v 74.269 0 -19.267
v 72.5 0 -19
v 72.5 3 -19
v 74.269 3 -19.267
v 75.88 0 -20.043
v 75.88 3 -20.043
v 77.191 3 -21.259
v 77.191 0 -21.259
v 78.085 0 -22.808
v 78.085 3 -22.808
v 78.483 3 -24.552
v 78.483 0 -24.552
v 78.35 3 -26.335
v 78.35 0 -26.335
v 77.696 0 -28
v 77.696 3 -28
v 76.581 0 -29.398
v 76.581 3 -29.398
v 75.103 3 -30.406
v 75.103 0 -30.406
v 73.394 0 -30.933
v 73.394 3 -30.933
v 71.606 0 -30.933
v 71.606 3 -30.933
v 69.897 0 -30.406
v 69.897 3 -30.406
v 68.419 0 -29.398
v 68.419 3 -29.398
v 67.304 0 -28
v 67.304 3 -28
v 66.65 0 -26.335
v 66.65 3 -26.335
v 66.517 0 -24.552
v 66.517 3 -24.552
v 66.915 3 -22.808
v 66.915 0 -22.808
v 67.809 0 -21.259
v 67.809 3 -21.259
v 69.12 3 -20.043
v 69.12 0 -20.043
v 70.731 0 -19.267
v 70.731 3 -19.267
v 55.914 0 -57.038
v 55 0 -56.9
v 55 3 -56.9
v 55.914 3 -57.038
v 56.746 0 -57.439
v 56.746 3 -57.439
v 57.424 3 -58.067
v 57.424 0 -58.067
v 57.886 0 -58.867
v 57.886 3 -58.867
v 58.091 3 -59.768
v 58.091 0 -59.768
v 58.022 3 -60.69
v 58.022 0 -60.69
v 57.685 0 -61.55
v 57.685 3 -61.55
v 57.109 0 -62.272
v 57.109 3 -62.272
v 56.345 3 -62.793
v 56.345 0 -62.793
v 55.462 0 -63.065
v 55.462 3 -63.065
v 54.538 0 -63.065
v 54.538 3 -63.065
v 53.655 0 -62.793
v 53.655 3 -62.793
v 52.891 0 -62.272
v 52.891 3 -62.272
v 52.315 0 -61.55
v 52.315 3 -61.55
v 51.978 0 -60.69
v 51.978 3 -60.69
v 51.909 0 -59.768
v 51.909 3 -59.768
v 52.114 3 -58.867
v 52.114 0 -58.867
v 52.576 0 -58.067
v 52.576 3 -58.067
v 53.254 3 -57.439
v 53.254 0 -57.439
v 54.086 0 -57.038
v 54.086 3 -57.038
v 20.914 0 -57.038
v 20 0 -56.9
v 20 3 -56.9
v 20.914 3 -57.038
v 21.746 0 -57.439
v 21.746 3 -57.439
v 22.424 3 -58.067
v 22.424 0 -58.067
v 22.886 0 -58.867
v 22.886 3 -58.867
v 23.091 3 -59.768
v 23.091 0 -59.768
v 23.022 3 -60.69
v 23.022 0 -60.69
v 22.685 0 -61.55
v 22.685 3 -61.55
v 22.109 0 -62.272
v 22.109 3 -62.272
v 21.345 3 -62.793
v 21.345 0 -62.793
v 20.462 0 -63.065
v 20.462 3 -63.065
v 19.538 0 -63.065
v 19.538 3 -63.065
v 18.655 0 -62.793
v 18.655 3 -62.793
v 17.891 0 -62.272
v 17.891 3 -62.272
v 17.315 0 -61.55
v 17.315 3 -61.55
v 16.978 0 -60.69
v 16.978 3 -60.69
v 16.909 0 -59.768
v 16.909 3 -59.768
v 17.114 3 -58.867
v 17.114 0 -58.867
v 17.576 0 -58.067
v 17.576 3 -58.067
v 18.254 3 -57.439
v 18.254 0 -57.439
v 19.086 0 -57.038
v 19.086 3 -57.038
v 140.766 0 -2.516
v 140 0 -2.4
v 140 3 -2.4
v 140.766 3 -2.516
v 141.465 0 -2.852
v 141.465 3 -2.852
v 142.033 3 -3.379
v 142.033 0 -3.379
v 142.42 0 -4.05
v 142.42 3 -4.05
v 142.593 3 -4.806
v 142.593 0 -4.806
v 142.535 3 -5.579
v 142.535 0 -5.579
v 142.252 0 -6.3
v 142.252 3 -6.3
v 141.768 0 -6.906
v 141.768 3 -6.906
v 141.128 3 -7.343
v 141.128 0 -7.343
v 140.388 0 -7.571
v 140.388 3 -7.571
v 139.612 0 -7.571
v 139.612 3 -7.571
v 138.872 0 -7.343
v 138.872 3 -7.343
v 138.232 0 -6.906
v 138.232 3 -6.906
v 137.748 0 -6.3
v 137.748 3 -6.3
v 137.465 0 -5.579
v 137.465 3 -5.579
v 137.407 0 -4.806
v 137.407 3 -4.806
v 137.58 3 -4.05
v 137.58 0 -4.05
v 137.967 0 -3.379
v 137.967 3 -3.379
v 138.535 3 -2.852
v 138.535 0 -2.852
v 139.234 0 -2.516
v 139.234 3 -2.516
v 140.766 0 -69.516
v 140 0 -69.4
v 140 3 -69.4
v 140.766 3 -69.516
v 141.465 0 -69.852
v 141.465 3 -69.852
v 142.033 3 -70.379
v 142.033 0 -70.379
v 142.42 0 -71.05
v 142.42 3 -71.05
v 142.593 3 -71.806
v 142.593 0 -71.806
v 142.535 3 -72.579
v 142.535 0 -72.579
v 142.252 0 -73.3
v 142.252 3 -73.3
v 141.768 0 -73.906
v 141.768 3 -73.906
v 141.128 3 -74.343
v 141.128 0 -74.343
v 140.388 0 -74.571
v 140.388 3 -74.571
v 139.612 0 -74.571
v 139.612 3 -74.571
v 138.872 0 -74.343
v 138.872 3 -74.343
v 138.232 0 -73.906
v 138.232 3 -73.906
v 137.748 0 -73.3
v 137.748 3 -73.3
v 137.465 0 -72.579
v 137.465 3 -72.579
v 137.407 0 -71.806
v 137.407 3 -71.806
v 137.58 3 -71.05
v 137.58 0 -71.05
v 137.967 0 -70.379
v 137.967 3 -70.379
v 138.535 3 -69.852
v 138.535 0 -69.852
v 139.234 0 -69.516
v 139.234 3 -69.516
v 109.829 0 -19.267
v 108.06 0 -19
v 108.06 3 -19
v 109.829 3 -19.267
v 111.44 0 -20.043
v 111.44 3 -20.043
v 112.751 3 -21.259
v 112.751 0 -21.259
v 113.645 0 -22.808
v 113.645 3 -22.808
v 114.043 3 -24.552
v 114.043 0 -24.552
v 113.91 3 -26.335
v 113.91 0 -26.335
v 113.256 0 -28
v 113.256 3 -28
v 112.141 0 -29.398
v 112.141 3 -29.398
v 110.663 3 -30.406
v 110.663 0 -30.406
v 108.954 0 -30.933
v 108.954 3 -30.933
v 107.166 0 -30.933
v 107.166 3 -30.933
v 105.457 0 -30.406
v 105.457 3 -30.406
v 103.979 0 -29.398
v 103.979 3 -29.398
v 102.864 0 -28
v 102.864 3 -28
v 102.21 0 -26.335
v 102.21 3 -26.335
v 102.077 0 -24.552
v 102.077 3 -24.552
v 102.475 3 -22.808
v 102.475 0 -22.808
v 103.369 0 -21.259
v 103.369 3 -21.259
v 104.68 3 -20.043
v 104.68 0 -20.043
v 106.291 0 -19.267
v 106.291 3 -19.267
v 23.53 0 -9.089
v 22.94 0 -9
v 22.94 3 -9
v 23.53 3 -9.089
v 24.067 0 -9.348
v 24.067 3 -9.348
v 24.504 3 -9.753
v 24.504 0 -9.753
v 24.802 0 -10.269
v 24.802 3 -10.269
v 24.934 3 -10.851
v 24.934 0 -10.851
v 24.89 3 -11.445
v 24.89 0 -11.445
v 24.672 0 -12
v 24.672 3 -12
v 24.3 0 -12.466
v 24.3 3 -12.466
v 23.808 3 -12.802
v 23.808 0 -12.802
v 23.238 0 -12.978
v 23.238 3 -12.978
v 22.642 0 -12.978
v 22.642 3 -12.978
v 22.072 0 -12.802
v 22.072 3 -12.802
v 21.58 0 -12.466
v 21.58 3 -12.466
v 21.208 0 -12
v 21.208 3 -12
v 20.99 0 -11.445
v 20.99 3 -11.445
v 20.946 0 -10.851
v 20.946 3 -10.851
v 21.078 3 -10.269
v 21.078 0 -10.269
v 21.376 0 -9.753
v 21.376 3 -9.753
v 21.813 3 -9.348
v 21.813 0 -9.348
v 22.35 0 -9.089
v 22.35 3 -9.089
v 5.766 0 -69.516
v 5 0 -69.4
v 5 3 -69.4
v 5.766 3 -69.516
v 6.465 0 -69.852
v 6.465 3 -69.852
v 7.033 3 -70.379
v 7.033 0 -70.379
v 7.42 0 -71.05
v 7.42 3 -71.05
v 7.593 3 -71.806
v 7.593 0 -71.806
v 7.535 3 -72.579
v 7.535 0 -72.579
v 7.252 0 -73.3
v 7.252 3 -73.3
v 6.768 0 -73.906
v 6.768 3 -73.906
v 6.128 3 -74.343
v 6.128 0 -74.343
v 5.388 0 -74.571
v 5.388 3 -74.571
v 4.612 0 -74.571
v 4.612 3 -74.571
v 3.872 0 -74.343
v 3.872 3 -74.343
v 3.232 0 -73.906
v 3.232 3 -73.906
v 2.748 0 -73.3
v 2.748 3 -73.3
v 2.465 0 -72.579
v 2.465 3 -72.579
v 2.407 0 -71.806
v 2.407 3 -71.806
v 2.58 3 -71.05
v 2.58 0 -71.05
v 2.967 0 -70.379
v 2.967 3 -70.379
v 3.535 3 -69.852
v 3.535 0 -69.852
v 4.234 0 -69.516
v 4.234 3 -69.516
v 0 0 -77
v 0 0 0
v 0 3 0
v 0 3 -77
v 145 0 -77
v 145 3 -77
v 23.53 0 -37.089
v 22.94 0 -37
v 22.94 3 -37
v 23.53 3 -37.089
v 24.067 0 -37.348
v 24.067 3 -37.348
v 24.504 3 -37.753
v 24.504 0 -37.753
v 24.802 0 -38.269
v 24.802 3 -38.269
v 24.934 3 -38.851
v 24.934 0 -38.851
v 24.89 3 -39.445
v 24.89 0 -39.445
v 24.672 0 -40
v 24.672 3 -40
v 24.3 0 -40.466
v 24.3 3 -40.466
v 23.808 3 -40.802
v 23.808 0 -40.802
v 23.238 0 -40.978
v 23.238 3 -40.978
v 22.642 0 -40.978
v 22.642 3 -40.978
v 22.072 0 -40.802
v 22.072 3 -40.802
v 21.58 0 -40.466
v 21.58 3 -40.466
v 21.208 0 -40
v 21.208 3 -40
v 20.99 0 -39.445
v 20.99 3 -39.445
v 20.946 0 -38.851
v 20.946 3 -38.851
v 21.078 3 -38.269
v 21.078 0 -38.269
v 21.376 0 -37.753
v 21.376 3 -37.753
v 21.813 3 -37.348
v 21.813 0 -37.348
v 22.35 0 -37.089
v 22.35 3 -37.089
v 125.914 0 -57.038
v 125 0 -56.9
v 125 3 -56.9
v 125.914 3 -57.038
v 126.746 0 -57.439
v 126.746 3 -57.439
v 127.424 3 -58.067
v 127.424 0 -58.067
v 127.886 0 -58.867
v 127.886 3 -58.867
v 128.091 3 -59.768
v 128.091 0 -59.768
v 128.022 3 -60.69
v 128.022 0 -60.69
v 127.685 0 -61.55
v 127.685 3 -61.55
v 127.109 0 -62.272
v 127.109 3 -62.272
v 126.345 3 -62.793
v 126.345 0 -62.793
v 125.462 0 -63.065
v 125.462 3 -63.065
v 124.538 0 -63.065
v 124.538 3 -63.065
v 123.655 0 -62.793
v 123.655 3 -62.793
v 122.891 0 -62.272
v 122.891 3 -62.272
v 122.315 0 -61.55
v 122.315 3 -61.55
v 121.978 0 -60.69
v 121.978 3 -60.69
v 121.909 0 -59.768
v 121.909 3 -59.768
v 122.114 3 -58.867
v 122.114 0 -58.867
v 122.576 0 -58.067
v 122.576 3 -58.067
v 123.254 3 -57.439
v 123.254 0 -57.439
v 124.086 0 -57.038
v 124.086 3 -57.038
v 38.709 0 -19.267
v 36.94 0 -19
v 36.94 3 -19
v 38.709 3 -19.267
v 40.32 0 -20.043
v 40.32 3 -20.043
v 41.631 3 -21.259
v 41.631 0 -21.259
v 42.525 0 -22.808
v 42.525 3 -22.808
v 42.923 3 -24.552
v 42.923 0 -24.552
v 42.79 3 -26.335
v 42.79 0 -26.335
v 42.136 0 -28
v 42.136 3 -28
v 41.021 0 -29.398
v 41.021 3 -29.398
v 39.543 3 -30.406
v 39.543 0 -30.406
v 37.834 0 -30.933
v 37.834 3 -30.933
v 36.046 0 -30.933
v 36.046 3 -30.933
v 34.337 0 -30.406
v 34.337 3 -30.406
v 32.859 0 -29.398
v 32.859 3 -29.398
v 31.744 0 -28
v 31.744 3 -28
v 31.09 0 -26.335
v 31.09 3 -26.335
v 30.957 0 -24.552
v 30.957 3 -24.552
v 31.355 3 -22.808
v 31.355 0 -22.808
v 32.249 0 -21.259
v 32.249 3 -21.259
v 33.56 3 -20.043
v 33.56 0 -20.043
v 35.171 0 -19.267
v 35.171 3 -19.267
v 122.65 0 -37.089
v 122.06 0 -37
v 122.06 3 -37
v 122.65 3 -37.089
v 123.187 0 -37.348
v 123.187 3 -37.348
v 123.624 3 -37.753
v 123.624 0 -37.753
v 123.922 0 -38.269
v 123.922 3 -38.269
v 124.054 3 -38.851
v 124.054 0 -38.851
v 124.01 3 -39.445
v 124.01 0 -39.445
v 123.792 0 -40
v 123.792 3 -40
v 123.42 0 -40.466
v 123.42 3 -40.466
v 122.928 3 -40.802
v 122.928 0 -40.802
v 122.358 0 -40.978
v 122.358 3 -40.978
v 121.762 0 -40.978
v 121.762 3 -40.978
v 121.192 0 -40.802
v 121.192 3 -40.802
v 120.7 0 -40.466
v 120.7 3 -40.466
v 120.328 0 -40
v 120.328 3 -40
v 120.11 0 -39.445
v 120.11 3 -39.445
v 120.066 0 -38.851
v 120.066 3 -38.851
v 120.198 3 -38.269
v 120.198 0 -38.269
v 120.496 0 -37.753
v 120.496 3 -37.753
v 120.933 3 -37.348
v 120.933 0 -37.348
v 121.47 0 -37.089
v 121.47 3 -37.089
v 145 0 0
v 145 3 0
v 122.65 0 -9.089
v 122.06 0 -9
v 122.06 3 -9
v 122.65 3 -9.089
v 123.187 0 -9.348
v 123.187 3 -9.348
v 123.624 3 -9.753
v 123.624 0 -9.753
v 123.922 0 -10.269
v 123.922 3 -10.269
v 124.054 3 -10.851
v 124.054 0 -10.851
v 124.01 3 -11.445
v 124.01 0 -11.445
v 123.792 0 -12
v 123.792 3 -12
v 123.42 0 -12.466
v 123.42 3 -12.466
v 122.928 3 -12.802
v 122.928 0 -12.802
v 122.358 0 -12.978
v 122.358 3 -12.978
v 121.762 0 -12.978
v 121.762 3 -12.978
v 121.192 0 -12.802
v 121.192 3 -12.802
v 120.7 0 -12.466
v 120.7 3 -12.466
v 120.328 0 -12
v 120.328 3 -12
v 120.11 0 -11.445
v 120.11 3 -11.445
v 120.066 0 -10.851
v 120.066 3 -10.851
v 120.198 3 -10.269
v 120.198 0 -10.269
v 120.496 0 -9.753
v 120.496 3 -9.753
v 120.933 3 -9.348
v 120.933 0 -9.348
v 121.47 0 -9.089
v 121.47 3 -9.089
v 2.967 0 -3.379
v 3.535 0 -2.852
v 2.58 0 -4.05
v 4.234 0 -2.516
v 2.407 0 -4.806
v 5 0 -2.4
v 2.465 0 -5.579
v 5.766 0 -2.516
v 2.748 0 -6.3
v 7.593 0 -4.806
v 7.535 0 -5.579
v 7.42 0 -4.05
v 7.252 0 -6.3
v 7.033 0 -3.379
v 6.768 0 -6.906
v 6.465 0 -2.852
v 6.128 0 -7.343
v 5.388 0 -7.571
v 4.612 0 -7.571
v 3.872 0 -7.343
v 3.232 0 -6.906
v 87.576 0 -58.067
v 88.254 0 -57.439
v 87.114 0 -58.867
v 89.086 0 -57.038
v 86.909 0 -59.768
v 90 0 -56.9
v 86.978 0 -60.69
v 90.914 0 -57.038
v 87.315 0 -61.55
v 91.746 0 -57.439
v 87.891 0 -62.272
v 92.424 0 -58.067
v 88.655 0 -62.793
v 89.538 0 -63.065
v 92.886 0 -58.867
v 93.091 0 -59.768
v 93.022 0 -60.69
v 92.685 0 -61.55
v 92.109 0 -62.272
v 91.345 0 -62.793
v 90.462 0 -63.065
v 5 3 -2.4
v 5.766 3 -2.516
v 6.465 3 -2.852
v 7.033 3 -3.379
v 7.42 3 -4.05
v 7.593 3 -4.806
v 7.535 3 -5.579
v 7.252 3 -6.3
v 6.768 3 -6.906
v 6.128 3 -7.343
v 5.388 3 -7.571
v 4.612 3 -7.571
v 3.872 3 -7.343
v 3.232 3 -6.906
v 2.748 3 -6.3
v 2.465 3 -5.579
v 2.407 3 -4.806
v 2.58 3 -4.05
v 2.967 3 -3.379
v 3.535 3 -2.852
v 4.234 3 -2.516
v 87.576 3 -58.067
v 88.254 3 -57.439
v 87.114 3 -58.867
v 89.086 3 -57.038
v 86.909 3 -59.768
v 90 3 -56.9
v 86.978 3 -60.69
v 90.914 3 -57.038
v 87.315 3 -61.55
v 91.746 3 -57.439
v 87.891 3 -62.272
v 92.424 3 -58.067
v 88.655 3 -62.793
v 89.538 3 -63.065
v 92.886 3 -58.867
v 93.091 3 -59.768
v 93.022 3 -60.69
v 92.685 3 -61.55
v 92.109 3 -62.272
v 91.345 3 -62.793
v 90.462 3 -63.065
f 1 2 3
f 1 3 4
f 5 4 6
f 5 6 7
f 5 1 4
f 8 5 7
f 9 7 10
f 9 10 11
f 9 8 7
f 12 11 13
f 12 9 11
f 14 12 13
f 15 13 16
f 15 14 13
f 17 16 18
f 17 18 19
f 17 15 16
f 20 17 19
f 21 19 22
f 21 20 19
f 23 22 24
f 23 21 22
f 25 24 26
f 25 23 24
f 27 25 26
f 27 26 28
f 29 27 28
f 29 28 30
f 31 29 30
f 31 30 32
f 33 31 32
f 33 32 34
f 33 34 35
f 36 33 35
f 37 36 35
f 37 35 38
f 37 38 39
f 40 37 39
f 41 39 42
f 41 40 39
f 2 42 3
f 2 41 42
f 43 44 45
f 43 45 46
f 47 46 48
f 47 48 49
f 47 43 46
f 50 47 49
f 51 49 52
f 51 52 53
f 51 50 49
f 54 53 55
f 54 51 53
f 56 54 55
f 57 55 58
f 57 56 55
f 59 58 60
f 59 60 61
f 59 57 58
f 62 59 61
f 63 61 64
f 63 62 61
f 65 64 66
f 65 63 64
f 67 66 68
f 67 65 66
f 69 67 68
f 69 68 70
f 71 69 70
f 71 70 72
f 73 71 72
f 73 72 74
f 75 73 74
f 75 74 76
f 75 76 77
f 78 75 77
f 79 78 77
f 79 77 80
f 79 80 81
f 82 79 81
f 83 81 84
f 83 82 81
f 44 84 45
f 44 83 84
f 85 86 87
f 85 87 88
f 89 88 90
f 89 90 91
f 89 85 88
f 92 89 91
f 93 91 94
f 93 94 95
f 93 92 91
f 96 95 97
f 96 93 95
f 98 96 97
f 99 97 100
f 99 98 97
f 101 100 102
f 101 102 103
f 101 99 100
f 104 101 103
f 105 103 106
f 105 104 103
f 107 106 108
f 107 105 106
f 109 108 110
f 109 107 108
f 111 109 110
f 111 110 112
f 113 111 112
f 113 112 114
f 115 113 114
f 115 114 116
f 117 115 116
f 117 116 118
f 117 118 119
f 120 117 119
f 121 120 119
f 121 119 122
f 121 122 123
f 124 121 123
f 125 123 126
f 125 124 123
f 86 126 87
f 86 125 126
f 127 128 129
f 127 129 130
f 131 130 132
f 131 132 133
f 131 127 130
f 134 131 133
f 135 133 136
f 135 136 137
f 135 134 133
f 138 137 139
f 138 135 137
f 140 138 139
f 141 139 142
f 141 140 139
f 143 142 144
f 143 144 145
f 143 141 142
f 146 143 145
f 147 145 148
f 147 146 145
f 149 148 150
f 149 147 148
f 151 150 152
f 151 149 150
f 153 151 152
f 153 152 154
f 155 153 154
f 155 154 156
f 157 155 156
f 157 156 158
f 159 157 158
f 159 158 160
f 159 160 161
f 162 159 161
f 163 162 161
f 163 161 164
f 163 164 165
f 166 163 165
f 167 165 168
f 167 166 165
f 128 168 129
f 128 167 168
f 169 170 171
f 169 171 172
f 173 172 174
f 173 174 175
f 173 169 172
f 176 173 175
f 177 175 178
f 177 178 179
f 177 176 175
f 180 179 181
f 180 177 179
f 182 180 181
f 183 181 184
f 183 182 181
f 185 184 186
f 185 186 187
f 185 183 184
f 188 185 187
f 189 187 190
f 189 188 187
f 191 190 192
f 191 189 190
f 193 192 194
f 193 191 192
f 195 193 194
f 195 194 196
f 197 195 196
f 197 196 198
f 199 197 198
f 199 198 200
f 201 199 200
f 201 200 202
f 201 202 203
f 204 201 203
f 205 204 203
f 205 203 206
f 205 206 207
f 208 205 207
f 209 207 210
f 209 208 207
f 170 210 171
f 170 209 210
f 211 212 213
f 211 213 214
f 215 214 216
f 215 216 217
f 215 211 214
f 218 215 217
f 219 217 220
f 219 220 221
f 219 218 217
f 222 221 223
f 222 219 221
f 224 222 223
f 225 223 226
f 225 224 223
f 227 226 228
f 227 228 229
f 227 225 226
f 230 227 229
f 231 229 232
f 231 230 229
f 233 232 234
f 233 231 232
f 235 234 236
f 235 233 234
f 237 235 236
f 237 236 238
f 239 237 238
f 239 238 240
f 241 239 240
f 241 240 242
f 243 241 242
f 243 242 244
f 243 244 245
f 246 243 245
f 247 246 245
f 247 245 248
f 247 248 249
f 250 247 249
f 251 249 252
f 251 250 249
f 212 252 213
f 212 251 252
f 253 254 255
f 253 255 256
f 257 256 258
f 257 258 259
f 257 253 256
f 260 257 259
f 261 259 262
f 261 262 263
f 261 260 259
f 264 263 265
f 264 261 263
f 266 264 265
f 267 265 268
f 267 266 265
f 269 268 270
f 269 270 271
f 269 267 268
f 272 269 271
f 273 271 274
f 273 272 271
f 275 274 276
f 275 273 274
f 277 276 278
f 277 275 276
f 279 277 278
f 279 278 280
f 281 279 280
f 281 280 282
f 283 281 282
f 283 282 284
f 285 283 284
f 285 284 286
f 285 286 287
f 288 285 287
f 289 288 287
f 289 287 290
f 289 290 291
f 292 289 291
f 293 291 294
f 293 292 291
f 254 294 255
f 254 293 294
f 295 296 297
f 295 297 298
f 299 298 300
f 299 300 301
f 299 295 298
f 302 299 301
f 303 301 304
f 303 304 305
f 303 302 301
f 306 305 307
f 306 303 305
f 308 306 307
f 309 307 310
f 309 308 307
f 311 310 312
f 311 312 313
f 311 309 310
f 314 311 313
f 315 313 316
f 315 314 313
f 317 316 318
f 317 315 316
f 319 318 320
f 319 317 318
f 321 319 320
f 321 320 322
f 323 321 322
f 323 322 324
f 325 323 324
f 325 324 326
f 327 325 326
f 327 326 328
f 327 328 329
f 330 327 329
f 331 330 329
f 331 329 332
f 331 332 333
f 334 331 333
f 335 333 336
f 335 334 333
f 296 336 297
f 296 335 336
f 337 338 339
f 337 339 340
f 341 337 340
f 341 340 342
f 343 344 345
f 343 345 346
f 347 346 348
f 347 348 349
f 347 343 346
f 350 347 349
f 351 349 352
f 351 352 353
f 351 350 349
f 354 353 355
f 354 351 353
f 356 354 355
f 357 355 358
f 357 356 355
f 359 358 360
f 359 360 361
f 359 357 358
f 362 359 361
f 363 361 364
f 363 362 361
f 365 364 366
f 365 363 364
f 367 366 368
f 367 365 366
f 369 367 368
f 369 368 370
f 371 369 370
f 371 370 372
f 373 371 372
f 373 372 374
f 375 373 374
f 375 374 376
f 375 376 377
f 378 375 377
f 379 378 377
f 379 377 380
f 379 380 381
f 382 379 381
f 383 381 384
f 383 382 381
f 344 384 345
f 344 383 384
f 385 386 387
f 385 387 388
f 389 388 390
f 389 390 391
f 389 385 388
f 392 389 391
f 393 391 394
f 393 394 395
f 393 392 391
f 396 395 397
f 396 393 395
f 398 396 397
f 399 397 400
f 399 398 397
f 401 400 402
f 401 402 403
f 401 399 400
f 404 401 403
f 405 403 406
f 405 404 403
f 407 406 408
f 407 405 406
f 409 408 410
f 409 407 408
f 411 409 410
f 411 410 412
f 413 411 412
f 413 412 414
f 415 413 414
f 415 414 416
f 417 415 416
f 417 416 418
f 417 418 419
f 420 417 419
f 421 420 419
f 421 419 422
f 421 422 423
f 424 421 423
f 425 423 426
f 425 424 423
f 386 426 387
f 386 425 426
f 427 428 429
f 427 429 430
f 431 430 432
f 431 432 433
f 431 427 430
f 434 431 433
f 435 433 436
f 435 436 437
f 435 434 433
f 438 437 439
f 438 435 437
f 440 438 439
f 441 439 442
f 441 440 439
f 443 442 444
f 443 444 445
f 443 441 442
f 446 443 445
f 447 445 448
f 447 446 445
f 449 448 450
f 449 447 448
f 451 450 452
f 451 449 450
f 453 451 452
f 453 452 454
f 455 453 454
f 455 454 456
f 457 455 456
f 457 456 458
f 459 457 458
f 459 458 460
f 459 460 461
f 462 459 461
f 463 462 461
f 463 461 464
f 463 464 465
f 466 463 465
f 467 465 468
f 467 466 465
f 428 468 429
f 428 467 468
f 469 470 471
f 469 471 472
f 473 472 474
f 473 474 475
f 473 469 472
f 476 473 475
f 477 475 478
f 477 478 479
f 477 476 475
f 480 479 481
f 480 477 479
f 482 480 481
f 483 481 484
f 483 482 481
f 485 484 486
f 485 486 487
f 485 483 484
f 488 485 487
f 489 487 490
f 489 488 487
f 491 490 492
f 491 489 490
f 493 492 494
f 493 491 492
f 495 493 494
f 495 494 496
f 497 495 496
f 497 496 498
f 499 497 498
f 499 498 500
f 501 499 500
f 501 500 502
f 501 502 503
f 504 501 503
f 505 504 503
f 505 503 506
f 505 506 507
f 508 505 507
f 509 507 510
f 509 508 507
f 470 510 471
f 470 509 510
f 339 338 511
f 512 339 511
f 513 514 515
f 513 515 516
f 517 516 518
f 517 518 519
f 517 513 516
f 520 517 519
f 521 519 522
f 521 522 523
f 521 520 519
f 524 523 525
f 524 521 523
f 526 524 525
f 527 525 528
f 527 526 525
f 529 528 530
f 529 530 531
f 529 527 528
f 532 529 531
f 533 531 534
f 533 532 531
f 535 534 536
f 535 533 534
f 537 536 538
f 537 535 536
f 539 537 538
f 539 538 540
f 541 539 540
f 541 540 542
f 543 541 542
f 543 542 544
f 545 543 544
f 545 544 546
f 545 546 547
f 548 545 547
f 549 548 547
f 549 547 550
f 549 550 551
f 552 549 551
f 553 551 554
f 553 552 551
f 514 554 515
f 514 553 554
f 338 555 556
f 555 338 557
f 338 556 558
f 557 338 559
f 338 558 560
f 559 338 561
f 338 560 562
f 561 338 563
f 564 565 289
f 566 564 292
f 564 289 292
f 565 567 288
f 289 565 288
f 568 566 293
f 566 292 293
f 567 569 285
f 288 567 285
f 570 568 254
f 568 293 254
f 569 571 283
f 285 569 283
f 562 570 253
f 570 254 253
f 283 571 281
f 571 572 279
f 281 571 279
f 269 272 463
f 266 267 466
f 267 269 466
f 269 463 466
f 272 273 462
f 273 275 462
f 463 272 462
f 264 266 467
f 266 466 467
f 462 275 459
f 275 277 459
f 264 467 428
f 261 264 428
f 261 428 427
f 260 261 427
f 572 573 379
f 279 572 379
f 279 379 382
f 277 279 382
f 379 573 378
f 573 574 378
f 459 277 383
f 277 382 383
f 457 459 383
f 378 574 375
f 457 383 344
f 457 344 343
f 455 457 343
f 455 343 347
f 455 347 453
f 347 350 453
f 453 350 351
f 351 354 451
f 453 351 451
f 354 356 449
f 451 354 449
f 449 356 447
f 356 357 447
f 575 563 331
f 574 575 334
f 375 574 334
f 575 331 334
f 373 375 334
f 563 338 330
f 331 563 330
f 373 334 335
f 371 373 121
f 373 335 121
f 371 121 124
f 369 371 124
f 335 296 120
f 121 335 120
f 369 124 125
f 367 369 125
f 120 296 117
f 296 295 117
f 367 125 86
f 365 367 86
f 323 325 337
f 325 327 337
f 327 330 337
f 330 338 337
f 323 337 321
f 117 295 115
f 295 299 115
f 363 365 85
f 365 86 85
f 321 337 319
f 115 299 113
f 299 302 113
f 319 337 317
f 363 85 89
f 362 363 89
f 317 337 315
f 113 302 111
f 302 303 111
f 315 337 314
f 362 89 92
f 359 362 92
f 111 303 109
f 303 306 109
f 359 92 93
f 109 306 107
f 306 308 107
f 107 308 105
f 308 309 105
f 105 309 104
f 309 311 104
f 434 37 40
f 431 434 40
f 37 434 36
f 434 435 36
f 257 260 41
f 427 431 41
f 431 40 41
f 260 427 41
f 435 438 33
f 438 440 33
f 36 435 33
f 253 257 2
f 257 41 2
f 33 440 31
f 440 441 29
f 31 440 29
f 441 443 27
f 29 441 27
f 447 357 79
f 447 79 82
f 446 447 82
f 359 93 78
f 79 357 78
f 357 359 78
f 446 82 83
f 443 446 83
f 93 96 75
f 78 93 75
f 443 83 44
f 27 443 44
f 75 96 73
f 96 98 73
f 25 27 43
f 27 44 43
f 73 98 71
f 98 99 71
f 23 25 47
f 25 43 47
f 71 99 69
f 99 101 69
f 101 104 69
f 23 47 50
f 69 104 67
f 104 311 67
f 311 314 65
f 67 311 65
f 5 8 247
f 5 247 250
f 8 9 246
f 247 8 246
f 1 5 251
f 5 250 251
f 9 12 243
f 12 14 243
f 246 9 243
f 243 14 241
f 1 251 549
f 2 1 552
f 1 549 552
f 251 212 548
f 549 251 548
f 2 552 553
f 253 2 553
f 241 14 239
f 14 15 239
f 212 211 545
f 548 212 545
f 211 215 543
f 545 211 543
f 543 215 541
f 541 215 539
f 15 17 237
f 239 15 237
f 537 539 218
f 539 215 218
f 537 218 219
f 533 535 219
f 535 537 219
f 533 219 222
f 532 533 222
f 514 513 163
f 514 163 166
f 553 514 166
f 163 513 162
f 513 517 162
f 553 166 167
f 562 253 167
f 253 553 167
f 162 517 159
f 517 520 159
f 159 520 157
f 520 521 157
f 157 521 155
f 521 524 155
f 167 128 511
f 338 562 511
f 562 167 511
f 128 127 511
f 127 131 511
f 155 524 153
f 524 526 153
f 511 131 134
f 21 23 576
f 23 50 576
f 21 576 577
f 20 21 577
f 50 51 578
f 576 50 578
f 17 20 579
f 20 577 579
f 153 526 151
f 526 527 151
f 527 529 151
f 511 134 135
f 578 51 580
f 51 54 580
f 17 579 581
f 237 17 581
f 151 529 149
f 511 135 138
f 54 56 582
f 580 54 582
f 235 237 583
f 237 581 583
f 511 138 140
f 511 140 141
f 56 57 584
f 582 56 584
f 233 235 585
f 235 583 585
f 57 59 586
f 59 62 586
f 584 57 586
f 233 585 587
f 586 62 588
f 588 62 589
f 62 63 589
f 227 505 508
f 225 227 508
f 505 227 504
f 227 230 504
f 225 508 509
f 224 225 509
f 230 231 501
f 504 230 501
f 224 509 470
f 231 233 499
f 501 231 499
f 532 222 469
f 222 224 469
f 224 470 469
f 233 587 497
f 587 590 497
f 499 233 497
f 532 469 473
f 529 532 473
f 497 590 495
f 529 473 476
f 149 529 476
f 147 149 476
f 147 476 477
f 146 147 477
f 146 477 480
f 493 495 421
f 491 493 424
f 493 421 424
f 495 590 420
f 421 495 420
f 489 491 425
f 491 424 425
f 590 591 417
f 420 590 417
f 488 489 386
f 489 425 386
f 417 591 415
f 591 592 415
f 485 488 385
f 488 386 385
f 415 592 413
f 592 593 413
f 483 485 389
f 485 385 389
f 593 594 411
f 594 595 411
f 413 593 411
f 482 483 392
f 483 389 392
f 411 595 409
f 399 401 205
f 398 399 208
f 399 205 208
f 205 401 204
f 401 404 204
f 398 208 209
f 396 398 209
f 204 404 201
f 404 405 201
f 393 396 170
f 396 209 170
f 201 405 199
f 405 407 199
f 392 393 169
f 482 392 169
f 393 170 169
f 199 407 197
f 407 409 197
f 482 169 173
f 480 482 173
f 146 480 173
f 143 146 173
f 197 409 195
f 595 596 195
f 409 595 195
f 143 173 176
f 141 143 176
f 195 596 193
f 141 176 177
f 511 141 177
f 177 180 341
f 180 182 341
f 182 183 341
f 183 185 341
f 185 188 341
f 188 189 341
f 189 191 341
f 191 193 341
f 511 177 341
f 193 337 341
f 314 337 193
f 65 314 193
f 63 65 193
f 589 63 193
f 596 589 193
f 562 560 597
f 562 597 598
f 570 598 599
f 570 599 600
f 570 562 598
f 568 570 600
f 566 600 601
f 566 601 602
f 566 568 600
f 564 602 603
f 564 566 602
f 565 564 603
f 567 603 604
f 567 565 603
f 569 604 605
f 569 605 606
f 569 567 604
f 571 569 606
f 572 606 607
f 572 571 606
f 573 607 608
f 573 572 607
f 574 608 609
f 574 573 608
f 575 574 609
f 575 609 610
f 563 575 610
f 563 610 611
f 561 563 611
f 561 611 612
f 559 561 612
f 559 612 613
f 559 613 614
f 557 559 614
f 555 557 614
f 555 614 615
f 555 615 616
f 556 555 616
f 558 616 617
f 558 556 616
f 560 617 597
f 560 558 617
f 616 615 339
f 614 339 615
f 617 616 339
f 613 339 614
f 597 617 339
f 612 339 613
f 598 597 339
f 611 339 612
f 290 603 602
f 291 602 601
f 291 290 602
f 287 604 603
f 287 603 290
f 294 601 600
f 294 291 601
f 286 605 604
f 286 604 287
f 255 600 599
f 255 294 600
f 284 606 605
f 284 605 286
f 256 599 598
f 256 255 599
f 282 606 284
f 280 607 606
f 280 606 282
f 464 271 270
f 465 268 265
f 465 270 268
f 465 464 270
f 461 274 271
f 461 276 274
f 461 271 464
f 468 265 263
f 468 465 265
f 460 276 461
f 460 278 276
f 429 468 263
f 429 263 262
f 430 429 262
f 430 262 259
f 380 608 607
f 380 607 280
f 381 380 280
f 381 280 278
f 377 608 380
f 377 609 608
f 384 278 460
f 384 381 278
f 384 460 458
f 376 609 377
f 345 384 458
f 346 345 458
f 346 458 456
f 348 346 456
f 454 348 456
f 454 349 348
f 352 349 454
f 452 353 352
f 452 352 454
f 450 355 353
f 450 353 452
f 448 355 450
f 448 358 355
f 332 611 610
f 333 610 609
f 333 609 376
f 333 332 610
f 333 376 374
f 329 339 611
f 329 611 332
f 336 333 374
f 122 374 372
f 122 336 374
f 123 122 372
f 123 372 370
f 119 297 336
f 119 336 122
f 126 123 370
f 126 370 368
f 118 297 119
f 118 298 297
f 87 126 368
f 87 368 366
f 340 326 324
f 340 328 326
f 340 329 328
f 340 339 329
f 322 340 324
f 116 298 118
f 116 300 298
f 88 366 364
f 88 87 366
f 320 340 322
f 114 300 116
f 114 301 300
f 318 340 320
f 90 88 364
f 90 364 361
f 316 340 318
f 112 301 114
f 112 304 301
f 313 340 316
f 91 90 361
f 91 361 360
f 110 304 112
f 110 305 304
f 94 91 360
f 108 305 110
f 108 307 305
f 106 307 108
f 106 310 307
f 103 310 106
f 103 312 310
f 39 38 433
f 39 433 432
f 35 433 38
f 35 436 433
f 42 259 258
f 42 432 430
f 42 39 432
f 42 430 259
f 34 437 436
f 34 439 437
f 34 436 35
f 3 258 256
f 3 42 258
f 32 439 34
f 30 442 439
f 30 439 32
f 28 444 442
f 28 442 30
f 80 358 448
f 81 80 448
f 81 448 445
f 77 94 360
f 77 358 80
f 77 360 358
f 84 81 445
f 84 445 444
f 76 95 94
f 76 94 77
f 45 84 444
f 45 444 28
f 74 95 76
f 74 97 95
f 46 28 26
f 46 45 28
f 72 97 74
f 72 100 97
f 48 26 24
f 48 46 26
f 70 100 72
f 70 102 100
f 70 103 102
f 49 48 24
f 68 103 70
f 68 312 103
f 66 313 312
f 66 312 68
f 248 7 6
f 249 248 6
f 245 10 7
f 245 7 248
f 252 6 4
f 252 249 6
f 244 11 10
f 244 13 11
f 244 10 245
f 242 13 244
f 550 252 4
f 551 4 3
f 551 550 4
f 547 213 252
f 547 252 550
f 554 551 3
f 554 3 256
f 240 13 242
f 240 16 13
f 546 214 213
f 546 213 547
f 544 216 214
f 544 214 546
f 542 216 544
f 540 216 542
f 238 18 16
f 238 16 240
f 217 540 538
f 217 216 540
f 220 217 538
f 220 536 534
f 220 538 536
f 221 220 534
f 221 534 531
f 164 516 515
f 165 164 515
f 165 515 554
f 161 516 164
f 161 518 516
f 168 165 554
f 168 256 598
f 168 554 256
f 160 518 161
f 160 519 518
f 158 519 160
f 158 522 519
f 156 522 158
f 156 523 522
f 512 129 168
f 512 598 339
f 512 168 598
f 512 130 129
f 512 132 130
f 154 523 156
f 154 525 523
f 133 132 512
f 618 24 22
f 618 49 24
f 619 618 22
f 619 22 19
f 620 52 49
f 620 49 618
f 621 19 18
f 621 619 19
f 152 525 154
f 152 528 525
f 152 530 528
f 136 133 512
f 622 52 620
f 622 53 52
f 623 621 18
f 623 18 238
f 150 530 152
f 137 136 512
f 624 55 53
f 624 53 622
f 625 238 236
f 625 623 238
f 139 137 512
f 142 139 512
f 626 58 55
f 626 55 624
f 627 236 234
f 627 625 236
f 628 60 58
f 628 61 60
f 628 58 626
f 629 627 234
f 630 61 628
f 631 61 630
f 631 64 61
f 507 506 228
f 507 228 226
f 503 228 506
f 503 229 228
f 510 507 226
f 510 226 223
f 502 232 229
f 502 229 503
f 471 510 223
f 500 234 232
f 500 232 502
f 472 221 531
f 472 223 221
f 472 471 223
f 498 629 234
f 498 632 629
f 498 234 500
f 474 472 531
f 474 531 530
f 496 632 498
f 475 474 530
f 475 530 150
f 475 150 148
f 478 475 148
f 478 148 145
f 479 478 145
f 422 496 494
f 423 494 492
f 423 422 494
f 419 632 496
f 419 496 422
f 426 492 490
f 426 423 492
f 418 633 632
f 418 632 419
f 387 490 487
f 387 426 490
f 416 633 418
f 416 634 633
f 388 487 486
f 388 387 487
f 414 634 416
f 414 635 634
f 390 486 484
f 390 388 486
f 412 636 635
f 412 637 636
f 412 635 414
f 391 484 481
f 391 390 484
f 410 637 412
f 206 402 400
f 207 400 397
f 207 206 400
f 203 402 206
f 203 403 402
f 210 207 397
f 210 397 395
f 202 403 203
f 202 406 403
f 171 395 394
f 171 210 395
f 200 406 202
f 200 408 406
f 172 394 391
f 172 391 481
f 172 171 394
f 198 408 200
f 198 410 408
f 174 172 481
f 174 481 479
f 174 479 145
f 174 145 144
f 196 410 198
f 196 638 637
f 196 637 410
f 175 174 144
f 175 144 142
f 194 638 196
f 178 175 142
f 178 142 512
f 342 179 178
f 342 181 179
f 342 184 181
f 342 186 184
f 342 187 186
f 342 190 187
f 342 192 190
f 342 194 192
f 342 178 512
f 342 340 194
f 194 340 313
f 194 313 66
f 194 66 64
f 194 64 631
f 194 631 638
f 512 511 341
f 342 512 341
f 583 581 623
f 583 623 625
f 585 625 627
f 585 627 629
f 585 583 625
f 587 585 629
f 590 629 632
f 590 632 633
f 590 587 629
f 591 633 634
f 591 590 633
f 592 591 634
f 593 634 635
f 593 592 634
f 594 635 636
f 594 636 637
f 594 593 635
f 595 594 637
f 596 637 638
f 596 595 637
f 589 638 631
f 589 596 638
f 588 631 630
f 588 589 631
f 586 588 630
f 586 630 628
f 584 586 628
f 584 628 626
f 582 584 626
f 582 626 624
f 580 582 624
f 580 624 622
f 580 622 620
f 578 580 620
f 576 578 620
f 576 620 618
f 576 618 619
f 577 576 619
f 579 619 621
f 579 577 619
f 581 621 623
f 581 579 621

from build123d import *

# Parameters (mm, degrees)
SKETCH1_W           = 145
SKETCH1_H           = 77
SKETCH1_R           = 3.1
SKETCH1_R_2         = 2.6
SKETCH1_R_3         = 6
SKETCH1_R_4         = 2
BOSS_EXTRUDE1_DEPTH = 3


with BuildPart() as part:
    # Sketch1 → Boss-Extrude1 (new body)
    with BuildSketch(Plane(origin=(0, 0, 0), x_dir=(1, 0, 0), z_dir=(0, 1, 0))):
        with Locations((72.5, 38.5)):
            Rectangle(SKETCH1_W, SKETCH1_H)
        with Locations(Location((20, 60, 0), (0, 0, 270))):
            Circle(SKETCH1_R, mode=Mode.SUBTRACT)
        with Locations(Location((55, 60, 0), (0, 0, 270))):
            Circle(SKETCH1_R, mode=Mode.SUBTRACT)
        with Locations(Location((90, 60, 0), (0, 0, 270))):
            Circle(SKETCH1_R, mode=Mode.SUBTRACT)
        with Locations(Location((125, 60, 0), (0, 0, 270))):
            Circle(SKETCH1_R, mode=Mode.SUBTRACT)
        with Locations(Location((5, 72, 0), (0, 0, 270))):
            Circle(SKETCH1_R_2, mode=Mode.SUBTRACT)
        with Locations(Location((5, 5, 0), (0, 0, 270))):
            Circle(SKETCH1_R_2, mode=Mode.SUBTRACT)
        with Locations(Location((140, 5, 0), (0, 0, 270))):
            Circle(SKETCH1_R_2, mode=Mode.SUBTRACT)
        with Locations(Location((140, 72, 0), (0, 0, 270))):
            Circle(SKETCH1_R_2, mode=Mode.SUBTRACT)
        with Locations(Location((36.94, 25, 0), (0, 0, 270))):
            Circle(SKETCH1_R_3, mode=Mode.SUBTRACT)
        with Locations(Location((72.5, 25, 0), (0, 0, 270))):
            Circle(SKETCH1_R_3, mode=Mode.SUBTRACT)
        with Locations(Location((108.06, 25, 0), (0, 0, 270))):
            Circle(SKETCH1_R_3, mode=Mode.SUBTRACT)
        with Locations(Location((22.94, 39, 0), (0, 0, 270))):
            Circle(SKETCH1_R_4, mode=Mode.SUBTRACT)
        with Locations(Location((122.06, 39, 0), (0, 0, 270))):
            Circle(SKETCH1_R_4, mode=Mode.SUBTRACT)
        with Locations(Location((122.06, 11, 0), (0, 0, 270))):
            Circle(SKETCH1_R_4, mode=Mode.SUBTRACT)
        with Locations(Location((22.94, 11, 0), (0, 0, 270))):
            Circle(SKETCH1_R_4, mode=Mode.SUBTRACT)
    extrude(amount=BOSS_EXTRUDE1_DEPTH)


solid = part.part
